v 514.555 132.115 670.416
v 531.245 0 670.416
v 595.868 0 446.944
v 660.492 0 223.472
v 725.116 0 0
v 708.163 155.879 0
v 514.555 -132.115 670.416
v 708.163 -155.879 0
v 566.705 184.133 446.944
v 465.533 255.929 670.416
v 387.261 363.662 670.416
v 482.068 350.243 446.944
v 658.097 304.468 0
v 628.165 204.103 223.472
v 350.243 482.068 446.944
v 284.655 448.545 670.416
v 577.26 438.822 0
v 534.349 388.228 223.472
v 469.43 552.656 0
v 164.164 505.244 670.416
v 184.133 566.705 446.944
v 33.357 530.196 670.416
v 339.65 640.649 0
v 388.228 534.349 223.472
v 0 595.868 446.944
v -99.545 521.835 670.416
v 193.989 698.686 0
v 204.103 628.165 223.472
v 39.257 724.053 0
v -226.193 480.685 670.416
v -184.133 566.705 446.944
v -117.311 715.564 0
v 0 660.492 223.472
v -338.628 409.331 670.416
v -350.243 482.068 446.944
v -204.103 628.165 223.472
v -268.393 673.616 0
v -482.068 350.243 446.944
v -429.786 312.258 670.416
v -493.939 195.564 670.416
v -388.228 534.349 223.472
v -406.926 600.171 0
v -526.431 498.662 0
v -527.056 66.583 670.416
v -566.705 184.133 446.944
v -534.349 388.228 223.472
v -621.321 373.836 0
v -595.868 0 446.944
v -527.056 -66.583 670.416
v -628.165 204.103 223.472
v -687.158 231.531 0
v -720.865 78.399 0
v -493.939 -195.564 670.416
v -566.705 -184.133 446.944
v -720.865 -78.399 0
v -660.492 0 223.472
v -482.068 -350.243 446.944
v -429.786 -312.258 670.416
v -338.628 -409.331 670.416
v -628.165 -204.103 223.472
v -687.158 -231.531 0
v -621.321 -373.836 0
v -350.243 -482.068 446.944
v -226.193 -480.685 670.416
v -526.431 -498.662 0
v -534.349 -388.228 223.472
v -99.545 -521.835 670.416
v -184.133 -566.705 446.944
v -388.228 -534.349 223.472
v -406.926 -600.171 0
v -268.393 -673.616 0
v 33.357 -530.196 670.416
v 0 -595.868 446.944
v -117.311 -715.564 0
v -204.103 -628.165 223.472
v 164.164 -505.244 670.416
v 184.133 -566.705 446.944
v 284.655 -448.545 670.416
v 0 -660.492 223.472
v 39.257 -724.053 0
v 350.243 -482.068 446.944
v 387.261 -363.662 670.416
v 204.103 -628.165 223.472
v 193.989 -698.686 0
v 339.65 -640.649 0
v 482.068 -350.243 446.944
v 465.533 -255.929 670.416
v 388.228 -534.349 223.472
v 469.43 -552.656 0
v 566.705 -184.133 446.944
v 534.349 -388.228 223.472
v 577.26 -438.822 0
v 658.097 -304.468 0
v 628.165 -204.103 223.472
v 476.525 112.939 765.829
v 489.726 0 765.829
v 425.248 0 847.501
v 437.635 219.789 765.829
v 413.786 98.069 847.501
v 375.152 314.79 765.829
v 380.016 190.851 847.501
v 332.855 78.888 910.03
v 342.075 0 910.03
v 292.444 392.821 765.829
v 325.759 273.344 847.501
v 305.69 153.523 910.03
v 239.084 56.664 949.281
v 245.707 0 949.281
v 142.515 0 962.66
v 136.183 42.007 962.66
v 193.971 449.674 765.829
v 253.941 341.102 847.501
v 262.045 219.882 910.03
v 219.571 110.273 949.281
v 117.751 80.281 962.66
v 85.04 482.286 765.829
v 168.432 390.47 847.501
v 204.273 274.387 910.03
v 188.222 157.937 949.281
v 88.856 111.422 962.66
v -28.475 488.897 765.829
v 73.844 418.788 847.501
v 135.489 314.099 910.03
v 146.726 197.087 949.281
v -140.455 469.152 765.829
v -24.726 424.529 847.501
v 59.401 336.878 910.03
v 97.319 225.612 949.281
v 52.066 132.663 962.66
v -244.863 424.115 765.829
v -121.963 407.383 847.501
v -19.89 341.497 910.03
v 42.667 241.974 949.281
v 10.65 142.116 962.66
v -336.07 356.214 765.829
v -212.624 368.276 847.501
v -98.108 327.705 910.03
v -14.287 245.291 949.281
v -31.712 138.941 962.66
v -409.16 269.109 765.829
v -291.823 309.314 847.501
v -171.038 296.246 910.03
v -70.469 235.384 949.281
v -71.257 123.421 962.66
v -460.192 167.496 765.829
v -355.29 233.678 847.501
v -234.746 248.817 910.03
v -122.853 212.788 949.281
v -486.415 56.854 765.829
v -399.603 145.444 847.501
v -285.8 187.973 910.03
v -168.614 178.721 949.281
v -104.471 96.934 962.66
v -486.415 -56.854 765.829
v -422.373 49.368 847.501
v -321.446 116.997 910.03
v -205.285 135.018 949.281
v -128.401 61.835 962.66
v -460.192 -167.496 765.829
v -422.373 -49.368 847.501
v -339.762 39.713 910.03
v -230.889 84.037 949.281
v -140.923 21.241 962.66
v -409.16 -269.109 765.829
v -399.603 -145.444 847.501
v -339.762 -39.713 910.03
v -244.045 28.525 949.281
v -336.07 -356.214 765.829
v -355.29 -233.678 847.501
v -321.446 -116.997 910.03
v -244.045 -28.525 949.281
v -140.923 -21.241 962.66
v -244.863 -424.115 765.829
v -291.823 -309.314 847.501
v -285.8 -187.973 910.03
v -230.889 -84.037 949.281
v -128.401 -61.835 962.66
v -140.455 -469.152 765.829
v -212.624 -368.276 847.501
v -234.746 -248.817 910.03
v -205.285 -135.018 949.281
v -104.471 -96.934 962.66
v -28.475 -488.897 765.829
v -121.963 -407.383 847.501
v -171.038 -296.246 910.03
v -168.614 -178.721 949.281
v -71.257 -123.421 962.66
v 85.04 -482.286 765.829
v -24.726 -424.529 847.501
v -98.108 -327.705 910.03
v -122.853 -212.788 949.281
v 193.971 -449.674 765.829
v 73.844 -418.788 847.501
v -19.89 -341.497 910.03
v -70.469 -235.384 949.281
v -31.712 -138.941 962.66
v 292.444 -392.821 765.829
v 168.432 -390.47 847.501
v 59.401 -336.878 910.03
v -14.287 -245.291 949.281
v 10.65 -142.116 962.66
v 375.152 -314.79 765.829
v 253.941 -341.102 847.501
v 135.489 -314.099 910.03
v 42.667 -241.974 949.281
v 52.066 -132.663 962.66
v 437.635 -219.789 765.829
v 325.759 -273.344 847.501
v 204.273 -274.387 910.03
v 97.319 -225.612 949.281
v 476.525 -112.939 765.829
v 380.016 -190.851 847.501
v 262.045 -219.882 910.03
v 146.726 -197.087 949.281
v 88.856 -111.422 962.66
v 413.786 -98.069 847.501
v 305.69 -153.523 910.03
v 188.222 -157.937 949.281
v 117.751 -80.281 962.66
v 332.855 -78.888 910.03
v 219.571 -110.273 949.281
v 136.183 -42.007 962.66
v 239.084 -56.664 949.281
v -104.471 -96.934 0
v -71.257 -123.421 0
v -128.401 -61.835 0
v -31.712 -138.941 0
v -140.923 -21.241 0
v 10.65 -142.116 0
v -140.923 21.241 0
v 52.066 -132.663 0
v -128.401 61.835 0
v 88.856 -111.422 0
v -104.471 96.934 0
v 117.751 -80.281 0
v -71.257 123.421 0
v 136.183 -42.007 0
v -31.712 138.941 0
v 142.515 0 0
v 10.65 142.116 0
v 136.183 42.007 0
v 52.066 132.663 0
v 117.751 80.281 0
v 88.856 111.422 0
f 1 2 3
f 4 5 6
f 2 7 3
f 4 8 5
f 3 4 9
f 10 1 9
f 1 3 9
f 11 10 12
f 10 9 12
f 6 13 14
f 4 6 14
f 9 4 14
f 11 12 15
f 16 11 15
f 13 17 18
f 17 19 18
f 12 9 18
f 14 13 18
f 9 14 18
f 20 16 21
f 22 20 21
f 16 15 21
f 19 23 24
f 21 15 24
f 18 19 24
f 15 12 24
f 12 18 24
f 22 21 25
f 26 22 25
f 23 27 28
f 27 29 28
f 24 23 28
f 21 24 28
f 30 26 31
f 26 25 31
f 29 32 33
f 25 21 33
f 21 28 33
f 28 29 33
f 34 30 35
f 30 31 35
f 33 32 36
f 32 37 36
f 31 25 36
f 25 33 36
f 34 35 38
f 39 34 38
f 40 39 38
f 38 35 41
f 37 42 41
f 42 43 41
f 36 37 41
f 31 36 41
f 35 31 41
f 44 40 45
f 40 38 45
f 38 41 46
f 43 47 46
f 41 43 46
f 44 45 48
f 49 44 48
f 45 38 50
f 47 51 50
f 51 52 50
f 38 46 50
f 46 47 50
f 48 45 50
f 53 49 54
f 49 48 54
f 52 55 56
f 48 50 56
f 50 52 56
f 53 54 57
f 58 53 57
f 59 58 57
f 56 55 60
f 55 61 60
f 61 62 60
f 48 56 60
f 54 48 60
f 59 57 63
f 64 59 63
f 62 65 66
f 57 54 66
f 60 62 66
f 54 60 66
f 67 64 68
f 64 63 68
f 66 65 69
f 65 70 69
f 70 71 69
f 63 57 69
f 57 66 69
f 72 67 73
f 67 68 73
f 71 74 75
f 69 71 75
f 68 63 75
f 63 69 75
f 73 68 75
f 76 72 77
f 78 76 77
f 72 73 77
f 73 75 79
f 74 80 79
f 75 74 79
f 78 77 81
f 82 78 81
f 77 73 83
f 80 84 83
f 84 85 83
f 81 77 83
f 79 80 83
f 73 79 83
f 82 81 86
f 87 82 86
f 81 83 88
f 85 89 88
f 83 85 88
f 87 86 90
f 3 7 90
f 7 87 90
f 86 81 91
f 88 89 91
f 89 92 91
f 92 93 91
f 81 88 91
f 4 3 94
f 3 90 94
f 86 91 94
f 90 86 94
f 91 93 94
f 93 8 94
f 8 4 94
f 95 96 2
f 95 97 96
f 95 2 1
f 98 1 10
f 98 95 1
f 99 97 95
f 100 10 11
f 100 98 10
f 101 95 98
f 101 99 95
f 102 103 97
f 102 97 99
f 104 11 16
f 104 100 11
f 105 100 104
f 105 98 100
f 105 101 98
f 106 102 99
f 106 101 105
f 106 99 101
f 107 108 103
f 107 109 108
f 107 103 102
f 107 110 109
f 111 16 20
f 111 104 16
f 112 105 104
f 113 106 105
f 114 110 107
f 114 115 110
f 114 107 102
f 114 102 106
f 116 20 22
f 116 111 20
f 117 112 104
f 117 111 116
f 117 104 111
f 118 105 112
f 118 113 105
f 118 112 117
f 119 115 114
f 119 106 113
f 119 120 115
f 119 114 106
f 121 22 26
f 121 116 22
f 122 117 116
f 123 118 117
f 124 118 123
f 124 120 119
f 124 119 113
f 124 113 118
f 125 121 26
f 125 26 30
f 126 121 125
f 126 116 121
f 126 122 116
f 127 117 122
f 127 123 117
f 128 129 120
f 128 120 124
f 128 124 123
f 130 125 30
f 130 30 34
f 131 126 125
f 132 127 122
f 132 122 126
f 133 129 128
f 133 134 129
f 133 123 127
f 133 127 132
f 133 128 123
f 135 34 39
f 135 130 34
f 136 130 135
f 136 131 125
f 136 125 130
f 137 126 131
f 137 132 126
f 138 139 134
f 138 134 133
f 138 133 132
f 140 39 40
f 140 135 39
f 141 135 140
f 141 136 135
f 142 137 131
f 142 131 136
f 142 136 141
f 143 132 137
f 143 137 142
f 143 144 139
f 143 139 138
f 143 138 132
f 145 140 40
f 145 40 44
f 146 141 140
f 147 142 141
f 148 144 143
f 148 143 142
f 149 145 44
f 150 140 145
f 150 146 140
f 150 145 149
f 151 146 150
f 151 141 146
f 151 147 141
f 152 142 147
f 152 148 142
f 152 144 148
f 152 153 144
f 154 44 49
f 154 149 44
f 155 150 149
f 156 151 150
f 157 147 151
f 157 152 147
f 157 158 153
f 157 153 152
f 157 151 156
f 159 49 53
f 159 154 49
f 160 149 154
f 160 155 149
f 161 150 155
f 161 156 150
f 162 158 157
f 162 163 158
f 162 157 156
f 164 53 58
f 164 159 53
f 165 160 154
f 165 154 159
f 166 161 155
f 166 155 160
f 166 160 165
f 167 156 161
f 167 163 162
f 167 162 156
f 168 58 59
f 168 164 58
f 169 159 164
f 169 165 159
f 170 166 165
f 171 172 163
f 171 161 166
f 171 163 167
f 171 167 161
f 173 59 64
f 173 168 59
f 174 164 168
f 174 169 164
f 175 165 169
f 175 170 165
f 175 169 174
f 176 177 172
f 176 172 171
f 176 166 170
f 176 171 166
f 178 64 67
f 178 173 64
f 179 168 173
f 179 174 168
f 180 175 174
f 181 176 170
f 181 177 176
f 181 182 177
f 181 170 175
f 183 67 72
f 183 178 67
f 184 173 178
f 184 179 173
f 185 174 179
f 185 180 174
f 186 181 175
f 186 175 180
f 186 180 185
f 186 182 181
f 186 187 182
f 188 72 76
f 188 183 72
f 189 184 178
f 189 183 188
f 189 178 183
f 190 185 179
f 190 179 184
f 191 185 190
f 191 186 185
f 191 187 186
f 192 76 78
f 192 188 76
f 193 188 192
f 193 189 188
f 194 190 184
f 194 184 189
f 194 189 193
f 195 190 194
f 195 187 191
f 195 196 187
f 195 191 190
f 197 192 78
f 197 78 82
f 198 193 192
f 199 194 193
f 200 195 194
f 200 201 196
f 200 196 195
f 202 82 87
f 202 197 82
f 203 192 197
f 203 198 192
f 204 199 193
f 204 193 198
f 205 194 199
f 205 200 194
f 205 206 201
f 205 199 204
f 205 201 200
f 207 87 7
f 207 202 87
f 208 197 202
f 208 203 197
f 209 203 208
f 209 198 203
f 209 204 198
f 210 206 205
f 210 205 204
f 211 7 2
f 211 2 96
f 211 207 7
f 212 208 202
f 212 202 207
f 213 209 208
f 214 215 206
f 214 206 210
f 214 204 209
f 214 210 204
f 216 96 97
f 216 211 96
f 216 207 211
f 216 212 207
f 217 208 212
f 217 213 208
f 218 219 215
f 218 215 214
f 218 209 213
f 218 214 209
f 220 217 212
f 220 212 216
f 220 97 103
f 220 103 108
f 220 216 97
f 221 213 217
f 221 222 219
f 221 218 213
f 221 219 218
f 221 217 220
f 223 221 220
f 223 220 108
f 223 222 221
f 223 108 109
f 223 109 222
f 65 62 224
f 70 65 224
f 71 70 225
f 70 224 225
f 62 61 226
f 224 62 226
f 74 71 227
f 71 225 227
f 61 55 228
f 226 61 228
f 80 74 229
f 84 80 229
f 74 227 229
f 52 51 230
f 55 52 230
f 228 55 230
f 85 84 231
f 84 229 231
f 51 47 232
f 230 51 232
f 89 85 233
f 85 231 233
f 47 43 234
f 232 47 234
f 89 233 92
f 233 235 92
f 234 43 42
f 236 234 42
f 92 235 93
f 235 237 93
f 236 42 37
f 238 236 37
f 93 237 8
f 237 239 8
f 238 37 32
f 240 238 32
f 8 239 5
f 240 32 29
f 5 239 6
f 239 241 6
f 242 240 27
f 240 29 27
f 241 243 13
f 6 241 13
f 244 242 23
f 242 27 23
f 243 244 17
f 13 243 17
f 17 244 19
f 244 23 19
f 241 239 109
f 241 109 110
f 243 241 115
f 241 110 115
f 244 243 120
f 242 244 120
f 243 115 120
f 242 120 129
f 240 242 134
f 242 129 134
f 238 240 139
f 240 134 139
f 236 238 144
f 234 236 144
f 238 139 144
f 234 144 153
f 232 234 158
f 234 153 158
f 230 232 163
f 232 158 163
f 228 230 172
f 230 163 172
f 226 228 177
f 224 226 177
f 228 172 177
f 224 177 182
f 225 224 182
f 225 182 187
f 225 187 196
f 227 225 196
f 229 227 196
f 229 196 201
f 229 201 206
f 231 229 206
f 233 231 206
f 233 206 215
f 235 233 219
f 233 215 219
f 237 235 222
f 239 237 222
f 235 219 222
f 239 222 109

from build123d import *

# Parameters (mm, degrees)
F0_R       = 725.116012299
F1_DEPTH   = 962.66
F2_R       = 446.733222467
F1_FACE1_R = 725.116012299
F4_R       = 404.6577748379
F5_DEPTH   = 962.66


with BuildPart() as f1:
    # F0 (on Top) → F1 (new body)
    with BuildSketch(Plane.XY):
        Circle(F0_R)
    extrude(amount=F1_DEPTH)

    # F2 (on face) → F3 section 0
    with BuildSketch(Plane.XY.offset(962.66)):
        Circle(F2_R)
    # F1_face1 (on face) → F3 section 1
    with BuildSketch(Plane(origin=(0, 0, 0), x_dir=(1, 0, 0), z_dir=(0, 0, -1))):
        Circle(F1_FACE1_R)
    loft(mode=Mode.INTERSECT)

    # F4
    f4_edges = [f1.edges().sort_by_distance(p)[0] for p in [
        (-446.733222, 0, 962.66),
    ]]
    fillet(f4_edges, radius=F4_R)

    # F5 (cut): a face of the model
    f5_faces = [f1.faces().sort_by_distance(p)[0] for p in [
        (0, 0, 962.66),
    ]]
    extrude(f5_faces, amount=-F5_DEPTH, mode=Mode.SUBTRACT)


solid = f1.part
